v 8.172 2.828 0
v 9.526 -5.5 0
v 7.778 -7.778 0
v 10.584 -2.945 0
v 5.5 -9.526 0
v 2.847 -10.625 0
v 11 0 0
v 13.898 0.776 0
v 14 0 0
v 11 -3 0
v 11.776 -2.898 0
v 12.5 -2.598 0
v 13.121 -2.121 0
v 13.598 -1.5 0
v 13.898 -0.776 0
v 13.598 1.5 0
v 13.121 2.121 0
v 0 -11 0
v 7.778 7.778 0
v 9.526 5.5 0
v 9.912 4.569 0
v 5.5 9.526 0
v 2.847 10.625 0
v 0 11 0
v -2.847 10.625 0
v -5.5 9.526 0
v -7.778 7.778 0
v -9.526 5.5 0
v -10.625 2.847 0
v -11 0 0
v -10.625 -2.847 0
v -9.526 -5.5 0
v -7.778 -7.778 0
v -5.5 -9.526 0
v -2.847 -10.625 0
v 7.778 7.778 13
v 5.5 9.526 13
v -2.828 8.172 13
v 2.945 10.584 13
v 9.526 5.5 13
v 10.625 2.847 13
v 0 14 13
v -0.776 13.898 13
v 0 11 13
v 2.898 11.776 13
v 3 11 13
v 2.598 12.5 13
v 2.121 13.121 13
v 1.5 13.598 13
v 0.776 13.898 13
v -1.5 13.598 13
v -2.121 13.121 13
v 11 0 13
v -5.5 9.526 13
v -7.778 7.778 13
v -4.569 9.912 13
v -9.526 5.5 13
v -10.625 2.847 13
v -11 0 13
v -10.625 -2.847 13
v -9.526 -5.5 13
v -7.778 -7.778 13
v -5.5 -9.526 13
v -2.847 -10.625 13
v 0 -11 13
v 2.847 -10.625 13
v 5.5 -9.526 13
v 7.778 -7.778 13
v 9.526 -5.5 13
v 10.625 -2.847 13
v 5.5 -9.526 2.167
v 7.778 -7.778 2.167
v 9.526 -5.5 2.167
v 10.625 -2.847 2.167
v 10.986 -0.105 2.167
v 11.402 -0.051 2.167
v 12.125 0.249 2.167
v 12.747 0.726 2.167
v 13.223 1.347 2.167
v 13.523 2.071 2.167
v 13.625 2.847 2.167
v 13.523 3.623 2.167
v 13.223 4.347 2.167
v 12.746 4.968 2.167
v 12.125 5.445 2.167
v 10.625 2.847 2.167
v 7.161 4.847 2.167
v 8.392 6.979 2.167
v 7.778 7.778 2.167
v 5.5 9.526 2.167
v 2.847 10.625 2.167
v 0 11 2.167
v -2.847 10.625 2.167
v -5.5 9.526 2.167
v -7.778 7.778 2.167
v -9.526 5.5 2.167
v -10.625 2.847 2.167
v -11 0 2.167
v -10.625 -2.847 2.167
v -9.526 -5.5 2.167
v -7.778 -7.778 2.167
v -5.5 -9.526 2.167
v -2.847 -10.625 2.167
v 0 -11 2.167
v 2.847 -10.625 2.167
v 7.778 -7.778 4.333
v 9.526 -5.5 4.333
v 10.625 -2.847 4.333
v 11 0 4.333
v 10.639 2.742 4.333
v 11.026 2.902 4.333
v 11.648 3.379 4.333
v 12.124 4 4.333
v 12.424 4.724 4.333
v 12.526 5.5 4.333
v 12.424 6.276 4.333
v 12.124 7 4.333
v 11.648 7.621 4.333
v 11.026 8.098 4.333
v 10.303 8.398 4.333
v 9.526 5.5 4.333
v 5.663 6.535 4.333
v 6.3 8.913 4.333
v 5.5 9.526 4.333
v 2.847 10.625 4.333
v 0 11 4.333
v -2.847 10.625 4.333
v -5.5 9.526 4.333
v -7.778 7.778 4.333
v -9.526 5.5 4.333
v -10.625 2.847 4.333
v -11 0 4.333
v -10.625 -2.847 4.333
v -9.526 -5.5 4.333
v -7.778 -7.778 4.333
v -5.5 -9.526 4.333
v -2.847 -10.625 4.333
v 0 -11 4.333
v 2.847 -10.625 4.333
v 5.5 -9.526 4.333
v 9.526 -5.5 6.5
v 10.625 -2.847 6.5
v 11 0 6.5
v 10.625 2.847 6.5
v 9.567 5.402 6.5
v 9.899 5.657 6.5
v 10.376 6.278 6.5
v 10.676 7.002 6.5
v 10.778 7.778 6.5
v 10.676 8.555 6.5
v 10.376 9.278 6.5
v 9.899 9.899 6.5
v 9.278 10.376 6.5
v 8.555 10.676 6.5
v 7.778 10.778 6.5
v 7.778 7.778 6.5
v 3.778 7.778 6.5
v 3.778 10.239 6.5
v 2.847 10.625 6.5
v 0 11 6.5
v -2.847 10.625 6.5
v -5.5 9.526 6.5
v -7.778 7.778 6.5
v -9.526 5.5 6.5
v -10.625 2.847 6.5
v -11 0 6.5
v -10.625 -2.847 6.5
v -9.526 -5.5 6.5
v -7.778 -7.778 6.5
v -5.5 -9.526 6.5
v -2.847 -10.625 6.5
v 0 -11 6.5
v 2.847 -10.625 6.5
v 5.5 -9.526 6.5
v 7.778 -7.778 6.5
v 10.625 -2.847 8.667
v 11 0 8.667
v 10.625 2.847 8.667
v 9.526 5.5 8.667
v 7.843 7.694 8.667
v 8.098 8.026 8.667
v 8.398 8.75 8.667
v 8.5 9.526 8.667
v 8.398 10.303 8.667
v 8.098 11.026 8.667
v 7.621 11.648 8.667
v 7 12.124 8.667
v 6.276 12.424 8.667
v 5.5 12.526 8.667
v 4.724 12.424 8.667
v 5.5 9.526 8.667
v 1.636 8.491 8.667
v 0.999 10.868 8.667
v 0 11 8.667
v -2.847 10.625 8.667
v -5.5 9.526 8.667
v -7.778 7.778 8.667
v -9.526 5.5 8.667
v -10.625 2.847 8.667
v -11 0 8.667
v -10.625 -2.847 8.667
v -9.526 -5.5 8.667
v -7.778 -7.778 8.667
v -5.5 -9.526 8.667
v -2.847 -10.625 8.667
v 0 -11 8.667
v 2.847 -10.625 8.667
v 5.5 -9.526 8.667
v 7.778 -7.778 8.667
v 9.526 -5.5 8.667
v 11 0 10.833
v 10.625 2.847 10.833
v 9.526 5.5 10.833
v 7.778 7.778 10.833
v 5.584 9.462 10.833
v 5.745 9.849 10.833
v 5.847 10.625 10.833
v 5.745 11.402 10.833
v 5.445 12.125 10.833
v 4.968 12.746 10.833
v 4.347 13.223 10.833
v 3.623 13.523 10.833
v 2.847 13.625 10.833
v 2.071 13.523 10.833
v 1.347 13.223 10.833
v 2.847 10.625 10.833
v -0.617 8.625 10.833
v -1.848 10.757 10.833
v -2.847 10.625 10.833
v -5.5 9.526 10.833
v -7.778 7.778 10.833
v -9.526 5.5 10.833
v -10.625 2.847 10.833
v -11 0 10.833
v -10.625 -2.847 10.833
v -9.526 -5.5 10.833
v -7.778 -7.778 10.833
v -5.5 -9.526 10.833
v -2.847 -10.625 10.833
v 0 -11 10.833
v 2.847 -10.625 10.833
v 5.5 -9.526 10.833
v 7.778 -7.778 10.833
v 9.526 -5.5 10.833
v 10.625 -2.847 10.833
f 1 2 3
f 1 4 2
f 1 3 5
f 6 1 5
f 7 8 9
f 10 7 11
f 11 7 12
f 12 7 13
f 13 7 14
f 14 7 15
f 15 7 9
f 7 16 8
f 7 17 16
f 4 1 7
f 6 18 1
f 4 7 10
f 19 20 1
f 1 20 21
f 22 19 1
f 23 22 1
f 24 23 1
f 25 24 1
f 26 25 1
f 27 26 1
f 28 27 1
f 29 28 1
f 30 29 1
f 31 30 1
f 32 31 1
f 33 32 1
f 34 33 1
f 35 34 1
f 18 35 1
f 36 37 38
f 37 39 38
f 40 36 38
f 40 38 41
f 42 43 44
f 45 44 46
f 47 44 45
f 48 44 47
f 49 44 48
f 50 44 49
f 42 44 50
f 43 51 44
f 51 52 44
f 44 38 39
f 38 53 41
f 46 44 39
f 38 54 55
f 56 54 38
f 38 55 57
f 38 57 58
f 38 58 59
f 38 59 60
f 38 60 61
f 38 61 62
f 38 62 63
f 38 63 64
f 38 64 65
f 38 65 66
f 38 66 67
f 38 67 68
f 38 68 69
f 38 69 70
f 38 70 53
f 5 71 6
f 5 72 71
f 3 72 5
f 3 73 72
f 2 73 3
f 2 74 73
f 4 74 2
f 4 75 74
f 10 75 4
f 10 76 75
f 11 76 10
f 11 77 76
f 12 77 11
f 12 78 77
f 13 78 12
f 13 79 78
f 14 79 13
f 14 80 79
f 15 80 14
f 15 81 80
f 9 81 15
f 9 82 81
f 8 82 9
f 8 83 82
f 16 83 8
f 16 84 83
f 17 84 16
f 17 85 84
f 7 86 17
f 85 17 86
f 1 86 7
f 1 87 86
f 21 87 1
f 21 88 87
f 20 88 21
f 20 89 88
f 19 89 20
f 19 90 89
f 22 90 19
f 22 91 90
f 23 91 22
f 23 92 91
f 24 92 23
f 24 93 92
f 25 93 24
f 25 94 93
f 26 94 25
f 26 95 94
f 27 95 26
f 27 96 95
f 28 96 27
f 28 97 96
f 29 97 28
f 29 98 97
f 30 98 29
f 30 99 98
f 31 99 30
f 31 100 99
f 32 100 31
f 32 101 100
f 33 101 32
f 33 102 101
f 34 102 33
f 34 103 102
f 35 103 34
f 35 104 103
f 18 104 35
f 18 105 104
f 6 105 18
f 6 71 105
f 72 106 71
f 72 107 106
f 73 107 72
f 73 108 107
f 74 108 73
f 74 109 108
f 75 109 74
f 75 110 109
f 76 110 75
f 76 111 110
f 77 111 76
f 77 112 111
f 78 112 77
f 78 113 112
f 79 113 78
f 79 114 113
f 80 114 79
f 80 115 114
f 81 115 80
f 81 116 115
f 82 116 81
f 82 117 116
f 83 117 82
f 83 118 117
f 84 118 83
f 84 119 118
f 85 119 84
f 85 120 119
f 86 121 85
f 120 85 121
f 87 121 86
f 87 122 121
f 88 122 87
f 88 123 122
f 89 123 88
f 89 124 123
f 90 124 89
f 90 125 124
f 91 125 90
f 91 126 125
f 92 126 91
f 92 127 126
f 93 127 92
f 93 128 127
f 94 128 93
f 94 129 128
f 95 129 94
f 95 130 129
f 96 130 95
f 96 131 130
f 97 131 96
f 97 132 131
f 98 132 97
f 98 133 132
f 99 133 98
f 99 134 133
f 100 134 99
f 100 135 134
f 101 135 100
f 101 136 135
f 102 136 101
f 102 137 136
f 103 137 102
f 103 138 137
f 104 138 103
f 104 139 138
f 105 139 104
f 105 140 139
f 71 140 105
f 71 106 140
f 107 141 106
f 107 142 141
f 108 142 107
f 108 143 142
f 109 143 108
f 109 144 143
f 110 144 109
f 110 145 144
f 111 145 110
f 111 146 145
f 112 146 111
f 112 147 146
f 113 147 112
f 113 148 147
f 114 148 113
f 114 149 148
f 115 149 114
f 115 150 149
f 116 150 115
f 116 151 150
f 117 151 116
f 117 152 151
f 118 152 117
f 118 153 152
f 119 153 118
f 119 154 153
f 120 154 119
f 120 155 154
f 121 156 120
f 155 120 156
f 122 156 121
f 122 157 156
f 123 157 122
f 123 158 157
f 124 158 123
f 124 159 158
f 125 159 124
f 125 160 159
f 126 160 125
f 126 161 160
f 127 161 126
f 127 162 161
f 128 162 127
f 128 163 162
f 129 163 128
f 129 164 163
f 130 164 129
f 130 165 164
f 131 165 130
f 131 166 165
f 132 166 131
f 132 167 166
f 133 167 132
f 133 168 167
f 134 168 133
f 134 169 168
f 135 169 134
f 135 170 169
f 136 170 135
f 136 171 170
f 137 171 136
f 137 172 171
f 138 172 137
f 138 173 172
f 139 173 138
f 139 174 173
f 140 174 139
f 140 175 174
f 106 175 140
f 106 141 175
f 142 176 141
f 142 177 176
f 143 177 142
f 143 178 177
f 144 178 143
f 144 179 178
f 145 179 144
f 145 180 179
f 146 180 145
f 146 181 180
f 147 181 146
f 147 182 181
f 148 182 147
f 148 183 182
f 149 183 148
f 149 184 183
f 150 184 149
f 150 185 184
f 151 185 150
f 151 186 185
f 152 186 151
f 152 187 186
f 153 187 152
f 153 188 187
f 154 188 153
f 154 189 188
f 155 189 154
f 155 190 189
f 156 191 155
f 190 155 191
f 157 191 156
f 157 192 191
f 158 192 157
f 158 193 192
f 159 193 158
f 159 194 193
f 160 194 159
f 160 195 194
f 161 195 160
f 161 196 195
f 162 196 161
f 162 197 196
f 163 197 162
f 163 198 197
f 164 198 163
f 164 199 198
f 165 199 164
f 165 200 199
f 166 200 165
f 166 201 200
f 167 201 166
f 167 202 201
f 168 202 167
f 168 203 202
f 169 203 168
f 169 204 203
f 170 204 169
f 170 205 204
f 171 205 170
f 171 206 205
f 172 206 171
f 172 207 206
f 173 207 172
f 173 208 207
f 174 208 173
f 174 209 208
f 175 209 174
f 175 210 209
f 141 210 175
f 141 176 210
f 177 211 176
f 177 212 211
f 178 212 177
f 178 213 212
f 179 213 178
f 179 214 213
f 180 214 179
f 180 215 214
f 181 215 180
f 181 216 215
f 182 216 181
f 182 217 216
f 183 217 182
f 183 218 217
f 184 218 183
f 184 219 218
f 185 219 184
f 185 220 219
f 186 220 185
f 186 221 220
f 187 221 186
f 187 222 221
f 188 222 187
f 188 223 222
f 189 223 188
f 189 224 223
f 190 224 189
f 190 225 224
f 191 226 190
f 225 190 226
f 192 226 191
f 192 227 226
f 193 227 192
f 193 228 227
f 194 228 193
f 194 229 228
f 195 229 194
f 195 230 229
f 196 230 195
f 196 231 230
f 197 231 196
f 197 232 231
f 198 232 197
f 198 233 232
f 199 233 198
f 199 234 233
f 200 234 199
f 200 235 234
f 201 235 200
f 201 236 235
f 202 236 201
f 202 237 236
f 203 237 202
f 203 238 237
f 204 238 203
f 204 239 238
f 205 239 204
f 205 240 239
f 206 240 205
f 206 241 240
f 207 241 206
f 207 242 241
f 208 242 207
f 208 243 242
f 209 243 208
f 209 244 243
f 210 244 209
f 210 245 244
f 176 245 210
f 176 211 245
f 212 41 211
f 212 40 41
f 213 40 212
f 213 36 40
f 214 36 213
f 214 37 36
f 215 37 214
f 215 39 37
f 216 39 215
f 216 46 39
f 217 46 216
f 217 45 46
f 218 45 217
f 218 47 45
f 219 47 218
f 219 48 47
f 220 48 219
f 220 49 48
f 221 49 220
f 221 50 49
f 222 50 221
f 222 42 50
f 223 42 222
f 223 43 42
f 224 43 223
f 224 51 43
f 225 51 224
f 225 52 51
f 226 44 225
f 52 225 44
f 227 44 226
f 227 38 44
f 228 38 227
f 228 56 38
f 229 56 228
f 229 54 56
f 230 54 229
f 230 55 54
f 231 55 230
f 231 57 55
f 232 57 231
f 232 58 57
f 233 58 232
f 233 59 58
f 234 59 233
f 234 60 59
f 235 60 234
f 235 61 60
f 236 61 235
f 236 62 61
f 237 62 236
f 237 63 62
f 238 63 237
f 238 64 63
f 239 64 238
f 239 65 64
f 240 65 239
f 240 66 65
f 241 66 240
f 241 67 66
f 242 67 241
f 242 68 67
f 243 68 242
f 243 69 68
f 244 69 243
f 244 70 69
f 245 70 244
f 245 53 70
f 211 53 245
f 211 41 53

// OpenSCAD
// Printable Sewing Machine - Sewing Mechanism
// Version 20100519

// Copyright 2010, by Andrew Plumb
// Licensed under the Attribution - Creative Commons license
//   http://creativecommons.org/licenses/by/3.0/

// For more information about OpenSCAD:
//   - see http://www.openscad.org/

// To Do:
// - finish modeling based on stitch formation description
//   http://en.wikipedia.org/wiki/Sewing_machine

$fa=15;
$fs=0.1;

bobbin_od=20.0; // outer diameter
bobbin_id=6.0; // inner diameter
bobbin_sd=8.0; // shaft diameter (on which thread is wrapped)
bobbin_h=12.0; // total height
bobbin_w=1.25; // width of outer bobbin lip/washer

608_id = 8.0;
608_od = 22.0;
608_w = 7.0;

shuttle_id=22.0; // match 608 Bearing OD
shuttle_od=25.0; // almost 25.4=1"
shuttle_beltw=2.0; // drive belt width
shuttle_beltd=1.0; // drive belt depth
shuttle_hookd=2.0; // hook depth 
shuttle_ih=bobbin_h+shuttle_hookd/2; // internal hole height
shuttle_wallw=(shuttle_od-shuttle_id)/2; // wall width

//render_part=1; // bobbin
// render_part=2; // hook_hole_2D
render_part=3; // hook_hole_3D
// render_part=4; // shuttle
// render_part=5; // shuttle bobbin housing

module bobbin(
	od=bobbin_od
	, id=bobbin_id
	, sd=bobbin_sd
	, h=bobbin_h
	, w=bobbin_w
	) {
  difference () {
    union () {
	cylinder(r=sd/2
	  , h=h
	  , center=false);
	cylinder(r=od/2
	  , h=w
	  , center=false);
	translate([0,0,h-w])
	  cylinder(r=od/2
	    , h=w
	    , center=false);
    }
    translate([0,0,-0.1])
	cylinder(r=id/2
	  , h=h+0.2
	  , center=false);
  }
}

module hook_hole_2D(
	od=shuttle_od
	, id=shuttle_id
	, ih=shuttle_ih
	, hookd=shuttle_hookd
	) {
  difference () {
    union () {
	circle(r=id/2);
	translate([id/2,0])
	  circle(r=(od-id));
    }
    translate([id/2,0]) rotate([0,0,45])
	square(size=2*hookd);
  }
}

module hook_hole_3D(
	od=shuttle_od
	, id=shuttle_id
	, ih=shuttle_ih
	, hookd=shuttle_hookd
	) {
  linear_extrude(height=ih
	, center=false
	, convexity = 10
	, twist = -90)
    hook_hole_2D(
	od=od
	, id=id
	, hookd=hookd
	);
}

module shuttle(
	id=shuttle_id
	, od=shuttle_od
	, beltw=shuttle_beltw
	, beltd=shuttle_beltd
	, hookd=shuttle_hookd
	, ih=shuttle_ih
	, wallw=shuttle_wallw
	) {
  difference () {
    union () {
	cylinder(r=od/2-beltd
	  , h=wallw+beltd+beltw+beltd+wallw+ih
	  , center=false);
	cylinder(r=od/2
	  , h=wallw
	  , center=false);
	translate([0,0,wallw])
	  cylinder(r1=od/2
	    , r2=od/2-beltd
	    , h=beltd
	    , center=false);
	translate([0,0,wallw+beltd+beltw])
	  cylinder(r1=od/2-beltd
	    , r2=od/2
	    , h=beltd
	    , center=false);
	translate([0,0,wallw+beltd+beltw+beltd])
	  cylinder(r=od/2
	    , h=wallw
	    , center=false);
	translate([0,0,wallw+beltd+beltw+beltd+wallw])
	  cylinder(r=od/2
	    , h=ih
	    , center=false);
    }
    translate([0,0,wallw+beltd+beltw+beltd+wallw])
	cylinder(r=id/2
	  , h=ih+0.1
	  , center=false);
    translate([0,0,wallw+beltd+beltw+beltd+wallw+ih-hookd])
	rotate([45,0,0])
	  scale([od,od,hookd]) cube(size=1.0,center=false);
    translate([0,0,wallw+beltd+beltw+beltd+wallw+ih-hookd])
	rotate([5,0,0])
	  scale([od,od,od]) cube(size=1.0,center=false);
  }
}
    
if(render_part==1) {
  echo("Rendering bobbin...");
  bobbin();
}

if(render_part==2) {
  echo("Rendering hook_hole_2D...");
  hook_hole_2D();
}


if(render_part==3) {
  echo("Rendering hook_hole_3D...");
  hook_hole_3D();
}

if(render_part==4) {
  echo("Rendering shuttle...");
  shuttle();
}
